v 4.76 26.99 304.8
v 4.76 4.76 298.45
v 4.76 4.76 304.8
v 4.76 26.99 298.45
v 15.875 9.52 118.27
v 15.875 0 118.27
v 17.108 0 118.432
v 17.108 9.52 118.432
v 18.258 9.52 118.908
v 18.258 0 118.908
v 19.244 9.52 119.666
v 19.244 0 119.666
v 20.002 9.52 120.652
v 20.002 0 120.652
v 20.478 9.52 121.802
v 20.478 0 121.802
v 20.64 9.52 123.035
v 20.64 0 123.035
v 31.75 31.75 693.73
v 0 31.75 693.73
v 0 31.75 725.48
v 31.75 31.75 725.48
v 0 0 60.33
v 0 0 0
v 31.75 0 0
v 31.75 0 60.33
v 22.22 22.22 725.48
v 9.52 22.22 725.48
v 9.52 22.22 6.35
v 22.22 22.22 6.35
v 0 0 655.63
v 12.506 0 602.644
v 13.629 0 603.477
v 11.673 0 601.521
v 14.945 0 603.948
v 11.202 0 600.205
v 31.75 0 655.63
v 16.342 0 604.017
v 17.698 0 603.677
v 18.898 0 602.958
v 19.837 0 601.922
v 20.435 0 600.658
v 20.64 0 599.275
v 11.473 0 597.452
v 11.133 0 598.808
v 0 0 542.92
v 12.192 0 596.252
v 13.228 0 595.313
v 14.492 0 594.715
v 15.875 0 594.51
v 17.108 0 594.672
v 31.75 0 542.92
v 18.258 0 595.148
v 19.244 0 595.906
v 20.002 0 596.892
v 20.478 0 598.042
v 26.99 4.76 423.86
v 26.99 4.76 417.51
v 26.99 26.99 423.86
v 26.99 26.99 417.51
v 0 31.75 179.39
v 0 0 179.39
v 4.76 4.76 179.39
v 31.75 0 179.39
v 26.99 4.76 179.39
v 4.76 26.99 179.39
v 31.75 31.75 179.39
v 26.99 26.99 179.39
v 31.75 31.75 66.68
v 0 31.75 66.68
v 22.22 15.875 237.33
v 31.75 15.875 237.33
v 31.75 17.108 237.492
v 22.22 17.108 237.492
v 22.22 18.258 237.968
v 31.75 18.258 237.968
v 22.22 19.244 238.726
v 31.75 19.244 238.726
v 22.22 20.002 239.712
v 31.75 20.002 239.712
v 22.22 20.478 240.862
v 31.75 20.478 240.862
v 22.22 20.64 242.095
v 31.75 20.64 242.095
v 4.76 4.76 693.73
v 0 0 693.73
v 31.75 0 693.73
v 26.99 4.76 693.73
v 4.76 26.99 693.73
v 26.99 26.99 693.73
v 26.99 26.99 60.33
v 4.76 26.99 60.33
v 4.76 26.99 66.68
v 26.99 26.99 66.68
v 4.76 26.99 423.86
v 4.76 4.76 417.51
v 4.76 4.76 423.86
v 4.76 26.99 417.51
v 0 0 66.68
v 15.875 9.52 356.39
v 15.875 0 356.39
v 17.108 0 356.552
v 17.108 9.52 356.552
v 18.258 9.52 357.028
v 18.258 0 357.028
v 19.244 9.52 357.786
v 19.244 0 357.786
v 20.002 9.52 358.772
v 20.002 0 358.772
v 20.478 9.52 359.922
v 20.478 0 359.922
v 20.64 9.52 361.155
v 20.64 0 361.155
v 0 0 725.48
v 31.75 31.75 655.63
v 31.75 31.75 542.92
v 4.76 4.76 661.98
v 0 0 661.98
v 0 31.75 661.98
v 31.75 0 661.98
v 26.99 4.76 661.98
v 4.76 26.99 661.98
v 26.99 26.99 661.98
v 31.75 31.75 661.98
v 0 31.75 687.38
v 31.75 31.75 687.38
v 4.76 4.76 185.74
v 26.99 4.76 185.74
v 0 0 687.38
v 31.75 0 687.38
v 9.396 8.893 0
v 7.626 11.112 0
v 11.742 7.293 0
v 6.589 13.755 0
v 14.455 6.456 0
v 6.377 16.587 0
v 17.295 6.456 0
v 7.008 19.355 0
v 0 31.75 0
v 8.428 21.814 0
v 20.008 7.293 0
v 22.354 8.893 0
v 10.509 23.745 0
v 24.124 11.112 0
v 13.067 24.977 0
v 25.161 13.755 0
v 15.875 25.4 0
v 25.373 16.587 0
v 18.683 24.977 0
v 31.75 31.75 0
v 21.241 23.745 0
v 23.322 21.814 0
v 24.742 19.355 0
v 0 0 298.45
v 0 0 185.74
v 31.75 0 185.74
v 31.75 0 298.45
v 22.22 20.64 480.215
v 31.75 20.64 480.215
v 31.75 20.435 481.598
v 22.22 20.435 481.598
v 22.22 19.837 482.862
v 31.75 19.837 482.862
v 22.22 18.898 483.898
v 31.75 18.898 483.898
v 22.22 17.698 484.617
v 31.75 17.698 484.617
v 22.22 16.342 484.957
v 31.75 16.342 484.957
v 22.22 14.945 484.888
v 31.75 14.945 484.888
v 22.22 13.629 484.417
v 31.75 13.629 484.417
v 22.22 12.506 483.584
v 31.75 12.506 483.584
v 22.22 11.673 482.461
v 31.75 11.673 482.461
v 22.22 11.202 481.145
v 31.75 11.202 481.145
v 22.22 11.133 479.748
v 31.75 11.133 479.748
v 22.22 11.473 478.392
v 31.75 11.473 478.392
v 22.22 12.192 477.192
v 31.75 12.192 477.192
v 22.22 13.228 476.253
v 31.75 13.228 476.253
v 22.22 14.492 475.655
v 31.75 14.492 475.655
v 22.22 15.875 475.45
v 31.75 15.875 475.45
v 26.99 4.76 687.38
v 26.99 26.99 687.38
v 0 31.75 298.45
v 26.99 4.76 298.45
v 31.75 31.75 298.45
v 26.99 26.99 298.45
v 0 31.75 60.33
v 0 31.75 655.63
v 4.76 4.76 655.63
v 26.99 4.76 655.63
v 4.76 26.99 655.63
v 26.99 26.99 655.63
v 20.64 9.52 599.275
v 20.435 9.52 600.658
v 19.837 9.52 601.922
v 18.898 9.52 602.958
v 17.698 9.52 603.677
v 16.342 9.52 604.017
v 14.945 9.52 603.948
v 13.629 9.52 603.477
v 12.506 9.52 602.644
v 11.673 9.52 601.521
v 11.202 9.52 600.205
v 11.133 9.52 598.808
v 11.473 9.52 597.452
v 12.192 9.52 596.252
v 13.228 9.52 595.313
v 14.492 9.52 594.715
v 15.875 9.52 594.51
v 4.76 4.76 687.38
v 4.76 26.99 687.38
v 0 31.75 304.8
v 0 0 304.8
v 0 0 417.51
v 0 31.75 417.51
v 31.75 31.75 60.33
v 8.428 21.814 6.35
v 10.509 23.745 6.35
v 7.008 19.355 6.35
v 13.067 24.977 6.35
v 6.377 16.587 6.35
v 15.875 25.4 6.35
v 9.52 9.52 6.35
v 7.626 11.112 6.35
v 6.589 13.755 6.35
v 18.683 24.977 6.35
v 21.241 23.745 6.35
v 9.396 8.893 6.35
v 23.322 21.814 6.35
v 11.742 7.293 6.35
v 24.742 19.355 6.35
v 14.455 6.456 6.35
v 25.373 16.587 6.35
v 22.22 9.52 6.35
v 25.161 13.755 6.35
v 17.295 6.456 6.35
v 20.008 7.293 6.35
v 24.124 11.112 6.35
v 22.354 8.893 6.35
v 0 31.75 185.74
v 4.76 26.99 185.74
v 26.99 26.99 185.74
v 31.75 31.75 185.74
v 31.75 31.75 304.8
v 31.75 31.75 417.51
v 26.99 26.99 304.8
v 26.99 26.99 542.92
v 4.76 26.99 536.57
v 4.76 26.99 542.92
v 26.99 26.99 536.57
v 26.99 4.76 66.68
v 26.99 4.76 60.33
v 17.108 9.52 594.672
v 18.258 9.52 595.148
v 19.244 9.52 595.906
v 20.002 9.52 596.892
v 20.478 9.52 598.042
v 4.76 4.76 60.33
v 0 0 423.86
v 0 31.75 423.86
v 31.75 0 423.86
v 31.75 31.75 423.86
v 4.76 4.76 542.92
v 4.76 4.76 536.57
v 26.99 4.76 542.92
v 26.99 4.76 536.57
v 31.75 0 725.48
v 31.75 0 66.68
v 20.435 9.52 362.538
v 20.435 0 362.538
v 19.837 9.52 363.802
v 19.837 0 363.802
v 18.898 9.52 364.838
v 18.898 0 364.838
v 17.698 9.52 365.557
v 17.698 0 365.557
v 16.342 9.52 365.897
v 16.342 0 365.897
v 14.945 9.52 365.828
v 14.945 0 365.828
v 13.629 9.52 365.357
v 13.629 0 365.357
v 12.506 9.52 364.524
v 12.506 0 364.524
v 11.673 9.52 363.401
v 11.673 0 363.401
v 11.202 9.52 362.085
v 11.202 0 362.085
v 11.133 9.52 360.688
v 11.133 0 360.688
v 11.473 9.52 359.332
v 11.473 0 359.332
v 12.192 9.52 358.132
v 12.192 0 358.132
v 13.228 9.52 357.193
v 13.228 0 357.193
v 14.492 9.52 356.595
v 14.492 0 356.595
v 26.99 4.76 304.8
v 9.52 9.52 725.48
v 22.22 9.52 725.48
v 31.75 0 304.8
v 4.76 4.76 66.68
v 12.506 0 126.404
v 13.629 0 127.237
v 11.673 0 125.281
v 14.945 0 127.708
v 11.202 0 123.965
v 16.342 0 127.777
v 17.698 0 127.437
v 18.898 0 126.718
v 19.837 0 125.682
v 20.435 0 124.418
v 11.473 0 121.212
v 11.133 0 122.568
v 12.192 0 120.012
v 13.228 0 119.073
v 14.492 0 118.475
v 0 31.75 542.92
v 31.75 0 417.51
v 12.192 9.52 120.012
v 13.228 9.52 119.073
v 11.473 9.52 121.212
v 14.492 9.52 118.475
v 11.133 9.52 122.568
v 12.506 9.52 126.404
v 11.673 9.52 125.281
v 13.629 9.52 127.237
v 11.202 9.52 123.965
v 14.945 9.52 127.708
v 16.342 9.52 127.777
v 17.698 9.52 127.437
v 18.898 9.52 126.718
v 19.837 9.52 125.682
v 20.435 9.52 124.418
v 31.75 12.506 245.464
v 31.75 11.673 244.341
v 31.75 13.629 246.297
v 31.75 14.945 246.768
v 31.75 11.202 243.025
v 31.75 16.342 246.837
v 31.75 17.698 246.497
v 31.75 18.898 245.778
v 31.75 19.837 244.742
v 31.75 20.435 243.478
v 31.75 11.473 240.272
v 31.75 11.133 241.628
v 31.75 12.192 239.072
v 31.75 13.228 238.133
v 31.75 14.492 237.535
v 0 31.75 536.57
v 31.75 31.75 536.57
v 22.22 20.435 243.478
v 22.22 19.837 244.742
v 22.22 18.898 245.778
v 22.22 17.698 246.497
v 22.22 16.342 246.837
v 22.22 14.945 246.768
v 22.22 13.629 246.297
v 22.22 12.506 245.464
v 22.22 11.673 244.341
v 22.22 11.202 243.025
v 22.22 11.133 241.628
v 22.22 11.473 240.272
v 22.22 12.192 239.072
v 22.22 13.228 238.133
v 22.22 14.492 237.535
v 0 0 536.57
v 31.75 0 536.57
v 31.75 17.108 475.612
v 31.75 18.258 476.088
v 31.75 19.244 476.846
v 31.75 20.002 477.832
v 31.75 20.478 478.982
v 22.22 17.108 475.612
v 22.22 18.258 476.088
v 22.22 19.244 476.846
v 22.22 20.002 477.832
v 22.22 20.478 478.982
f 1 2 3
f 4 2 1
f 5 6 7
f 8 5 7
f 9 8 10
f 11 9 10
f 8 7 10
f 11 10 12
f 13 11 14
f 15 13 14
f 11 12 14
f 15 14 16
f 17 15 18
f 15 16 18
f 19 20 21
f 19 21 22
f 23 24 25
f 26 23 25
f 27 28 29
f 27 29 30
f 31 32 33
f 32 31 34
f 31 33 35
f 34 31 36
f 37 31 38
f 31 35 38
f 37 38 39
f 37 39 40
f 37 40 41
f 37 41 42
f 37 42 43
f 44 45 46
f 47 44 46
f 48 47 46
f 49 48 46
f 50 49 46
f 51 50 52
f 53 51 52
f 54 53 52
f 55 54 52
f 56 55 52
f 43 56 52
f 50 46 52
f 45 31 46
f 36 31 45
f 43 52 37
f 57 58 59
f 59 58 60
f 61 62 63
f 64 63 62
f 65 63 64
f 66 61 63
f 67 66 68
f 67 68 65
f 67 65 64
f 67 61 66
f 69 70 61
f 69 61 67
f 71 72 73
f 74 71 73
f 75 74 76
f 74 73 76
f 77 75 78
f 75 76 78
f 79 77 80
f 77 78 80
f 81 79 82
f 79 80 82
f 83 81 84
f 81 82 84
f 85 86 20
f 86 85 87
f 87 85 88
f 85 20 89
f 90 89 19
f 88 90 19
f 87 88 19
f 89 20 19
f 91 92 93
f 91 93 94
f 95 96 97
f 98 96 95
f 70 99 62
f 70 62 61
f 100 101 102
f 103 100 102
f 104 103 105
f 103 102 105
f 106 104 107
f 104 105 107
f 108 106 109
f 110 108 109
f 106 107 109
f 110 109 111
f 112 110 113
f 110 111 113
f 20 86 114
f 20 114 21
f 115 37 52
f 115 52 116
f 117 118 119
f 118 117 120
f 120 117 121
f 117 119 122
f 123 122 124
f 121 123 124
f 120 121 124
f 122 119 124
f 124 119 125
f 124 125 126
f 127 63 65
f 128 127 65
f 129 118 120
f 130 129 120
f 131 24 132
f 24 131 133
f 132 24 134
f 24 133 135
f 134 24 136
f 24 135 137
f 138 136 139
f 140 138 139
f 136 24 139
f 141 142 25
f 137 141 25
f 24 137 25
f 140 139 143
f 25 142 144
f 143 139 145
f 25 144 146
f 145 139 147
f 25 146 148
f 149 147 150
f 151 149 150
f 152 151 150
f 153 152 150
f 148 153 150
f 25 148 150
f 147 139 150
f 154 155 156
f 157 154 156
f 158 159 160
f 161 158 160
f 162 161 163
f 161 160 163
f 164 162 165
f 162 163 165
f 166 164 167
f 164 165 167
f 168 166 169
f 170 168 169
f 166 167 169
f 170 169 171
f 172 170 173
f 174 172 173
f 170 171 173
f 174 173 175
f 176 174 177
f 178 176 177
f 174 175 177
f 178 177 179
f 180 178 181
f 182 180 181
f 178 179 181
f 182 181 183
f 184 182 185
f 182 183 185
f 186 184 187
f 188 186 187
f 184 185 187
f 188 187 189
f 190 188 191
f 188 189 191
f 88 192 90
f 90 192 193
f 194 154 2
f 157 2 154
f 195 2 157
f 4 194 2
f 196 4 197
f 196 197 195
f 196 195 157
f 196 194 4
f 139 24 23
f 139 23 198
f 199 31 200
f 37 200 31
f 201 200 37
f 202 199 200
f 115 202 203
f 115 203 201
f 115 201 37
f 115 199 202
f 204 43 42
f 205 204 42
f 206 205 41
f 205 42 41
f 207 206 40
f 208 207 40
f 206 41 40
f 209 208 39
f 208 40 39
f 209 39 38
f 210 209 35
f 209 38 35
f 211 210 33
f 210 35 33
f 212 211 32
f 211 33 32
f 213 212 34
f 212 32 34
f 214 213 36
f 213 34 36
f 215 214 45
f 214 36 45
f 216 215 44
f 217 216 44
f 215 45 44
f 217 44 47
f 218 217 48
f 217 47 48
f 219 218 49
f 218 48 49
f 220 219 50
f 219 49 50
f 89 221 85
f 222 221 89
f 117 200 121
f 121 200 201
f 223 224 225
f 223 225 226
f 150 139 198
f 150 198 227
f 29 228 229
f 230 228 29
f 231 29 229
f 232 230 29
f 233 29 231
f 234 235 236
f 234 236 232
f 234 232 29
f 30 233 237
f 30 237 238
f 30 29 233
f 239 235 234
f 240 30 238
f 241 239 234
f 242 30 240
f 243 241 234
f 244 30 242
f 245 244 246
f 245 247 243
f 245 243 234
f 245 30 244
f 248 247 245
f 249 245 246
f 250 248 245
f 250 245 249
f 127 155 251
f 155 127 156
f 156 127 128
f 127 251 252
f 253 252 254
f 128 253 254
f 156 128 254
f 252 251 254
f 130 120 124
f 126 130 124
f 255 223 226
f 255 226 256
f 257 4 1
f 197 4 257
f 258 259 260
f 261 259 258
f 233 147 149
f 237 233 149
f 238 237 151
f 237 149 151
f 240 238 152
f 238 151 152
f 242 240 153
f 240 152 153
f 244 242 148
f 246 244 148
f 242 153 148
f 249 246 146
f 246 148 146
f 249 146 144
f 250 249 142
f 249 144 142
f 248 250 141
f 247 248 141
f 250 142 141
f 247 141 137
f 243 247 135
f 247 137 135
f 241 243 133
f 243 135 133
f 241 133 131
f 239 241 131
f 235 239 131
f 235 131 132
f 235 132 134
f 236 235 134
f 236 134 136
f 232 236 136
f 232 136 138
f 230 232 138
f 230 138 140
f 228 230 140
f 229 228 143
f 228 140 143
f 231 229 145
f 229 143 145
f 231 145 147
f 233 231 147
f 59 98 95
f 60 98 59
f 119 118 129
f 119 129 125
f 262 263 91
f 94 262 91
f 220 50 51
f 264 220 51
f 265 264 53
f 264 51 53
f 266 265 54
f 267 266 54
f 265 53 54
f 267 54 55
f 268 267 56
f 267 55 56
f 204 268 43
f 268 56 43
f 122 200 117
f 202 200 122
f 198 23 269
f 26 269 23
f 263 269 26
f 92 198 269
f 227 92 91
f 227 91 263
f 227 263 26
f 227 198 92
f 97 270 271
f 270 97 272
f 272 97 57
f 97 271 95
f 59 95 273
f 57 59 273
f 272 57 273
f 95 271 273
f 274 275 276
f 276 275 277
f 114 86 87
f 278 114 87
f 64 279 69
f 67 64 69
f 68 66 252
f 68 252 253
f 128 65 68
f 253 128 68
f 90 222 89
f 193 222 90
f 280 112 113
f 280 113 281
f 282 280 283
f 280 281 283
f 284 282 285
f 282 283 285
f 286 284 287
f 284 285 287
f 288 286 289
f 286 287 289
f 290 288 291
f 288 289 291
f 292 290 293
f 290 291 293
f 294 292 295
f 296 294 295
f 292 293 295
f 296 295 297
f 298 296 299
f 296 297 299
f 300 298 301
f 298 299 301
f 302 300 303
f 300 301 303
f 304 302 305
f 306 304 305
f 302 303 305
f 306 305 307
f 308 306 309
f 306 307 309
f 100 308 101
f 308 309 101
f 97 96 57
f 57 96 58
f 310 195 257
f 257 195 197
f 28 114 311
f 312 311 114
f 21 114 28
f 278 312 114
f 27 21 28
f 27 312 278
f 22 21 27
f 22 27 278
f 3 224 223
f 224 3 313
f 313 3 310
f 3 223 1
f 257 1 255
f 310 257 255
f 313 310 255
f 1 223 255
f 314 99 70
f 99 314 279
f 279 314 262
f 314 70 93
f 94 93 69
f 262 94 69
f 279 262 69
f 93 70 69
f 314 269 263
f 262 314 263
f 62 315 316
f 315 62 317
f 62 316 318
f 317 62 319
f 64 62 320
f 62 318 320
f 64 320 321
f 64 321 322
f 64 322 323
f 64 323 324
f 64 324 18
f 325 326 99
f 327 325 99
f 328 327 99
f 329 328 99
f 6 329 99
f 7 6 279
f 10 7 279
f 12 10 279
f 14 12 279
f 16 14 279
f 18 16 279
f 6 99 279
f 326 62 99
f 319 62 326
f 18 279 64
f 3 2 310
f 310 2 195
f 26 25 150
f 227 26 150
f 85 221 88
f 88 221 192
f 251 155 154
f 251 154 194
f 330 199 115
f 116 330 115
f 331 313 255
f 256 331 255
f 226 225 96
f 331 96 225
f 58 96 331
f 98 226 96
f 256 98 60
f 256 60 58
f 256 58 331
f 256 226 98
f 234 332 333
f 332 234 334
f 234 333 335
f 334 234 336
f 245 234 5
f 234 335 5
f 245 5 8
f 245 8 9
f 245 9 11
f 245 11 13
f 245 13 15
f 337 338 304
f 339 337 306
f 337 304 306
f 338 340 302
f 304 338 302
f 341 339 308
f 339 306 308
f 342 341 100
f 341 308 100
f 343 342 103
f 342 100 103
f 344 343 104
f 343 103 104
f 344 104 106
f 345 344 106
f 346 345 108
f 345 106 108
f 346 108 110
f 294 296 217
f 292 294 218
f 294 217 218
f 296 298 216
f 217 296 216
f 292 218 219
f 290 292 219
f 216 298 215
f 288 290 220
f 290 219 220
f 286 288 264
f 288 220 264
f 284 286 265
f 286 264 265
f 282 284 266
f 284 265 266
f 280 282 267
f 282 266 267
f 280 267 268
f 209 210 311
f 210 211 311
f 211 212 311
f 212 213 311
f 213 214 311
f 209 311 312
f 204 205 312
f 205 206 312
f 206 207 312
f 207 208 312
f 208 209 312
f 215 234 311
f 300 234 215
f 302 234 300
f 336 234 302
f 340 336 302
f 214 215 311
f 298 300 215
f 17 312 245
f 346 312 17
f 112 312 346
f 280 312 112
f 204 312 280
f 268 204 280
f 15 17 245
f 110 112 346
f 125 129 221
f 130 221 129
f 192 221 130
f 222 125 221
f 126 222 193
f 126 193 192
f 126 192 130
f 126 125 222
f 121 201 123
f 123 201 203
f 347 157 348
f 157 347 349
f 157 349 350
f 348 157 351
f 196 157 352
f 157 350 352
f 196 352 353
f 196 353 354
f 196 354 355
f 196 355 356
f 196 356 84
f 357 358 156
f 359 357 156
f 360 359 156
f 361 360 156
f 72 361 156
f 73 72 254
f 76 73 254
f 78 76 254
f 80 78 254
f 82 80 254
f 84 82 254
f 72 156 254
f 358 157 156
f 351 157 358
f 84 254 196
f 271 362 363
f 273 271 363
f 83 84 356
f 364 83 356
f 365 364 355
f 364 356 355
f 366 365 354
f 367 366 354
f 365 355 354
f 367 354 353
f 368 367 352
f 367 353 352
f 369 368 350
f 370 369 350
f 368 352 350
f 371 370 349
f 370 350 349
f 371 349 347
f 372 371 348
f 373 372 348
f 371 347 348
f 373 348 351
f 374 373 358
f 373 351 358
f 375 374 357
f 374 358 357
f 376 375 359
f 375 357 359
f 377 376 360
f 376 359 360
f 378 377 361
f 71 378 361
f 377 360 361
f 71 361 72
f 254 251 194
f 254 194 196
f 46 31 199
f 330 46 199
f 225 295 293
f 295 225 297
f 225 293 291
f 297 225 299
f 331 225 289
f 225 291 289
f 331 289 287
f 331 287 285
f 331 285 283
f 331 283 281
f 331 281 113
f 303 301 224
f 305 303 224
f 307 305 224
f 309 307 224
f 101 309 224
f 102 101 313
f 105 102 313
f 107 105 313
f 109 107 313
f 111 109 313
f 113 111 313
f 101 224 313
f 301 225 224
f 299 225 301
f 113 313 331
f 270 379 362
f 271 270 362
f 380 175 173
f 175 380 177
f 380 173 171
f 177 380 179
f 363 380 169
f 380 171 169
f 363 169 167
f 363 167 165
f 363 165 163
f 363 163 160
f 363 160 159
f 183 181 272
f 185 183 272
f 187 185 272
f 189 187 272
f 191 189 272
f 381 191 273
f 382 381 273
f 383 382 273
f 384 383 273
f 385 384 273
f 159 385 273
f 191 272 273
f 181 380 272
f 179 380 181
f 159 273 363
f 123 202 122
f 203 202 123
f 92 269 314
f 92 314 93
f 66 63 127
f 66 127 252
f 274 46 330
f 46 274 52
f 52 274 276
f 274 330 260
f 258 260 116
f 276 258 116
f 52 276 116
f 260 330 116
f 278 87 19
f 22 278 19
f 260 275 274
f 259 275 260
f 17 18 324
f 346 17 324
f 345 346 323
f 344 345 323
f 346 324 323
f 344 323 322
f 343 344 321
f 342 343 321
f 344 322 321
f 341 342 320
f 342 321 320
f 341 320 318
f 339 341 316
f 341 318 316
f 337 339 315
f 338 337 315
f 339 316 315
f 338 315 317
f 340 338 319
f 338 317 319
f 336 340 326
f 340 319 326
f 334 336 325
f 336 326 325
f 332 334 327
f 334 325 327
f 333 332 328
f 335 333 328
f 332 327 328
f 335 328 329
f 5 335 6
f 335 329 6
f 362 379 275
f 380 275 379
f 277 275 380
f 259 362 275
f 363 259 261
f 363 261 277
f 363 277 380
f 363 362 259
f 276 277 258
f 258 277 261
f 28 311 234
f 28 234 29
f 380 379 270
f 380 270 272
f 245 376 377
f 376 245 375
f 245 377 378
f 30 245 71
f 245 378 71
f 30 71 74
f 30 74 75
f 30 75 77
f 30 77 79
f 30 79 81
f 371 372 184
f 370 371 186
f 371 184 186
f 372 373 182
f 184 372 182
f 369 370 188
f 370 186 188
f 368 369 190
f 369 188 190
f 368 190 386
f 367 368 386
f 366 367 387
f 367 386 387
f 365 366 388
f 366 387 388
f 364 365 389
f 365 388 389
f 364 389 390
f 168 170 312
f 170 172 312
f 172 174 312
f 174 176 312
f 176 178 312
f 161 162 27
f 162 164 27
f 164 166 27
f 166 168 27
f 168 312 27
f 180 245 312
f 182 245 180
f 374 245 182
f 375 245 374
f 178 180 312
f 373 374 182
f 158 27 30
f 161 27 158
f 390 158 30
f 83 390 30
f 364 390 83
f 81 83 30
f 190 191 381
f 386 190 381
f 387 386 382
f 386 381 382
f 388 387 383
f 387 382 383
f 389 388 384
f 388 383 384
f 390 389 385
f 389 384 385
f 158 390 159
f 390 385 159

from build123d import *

# Parameters (mm, degrees)
F0_W      = 31.75
F0_H      = 31.75
F1_DEPTH  = 60.33
F2_W      = 22.23
F2_H      = 22.23
F3_DEPTH  = 6.35
F4_W      = 31.75
F4_H      = 31.75
F5_DEPTH  = 112.71
F6_W      = 22.23
F6_H      = 22.23
F7_DEPTH  = 6.35
F8_W      = 31.75
F8_H      = 31.75
F8_W_2    = 22.23
F8_H_2    = 22.23
F9_DEPTH  = 112.71
F10_W     = 22.23
F10_H     = 22.23
F11_DEPTH = 6.35
F12_W     = 31.75
F12_H     = 31.75
F12_W_2   = 22.23
F12_H_2   = 22.23
F13_DEPTH = 112.71
F14_W     = 22.23
F14_H     = 22.23
F15_DEPTH = 6.35
F16_W     = 31.75
F16_H     = 31.75
F17_DEPTH = 112.71
F18_W     = 22.23
F18_H     = 22.23
F19_DEPTH = 6.35
F20_W     = 31.75
F20_H     = 31.75
F20_W_2   = 22.23
F20_H_2   = 22.23
F21_DEPTH = 112.71
F22_W     = 22.23
F22_H     = 22.23
F23_DEPTH = 6.35
F24_W     = 31.75
F24_H     = 31.75
F24_W_2   = 22.23
F24_H_2   = 22.23
F25_DEPTH = 25.4
F26_W     = 22.23
F26_H     = 22.23
F27_DEPTH = 6.35
F28_W     = 31.75
F28_H     = 31.75
F28_W_2   = 22.23
F28_H_2   = 22.23
F29_DEPTH = 31.75
F32_DEPTH = 12.7
F34_DEPTH = 12.7
F36_DEPTH = 12.7
F38_DEPTH = 12.7
F40_DEPTH = 12.7
F41_W     = 12.7
F41_H     = 12.7
F42_DEPTH = 736.6
F43_DEPTH = 6.35


with BuildPart() as f1:
    # F0 (on Top) → F1 (new body)
    with BuildSketch(Plane.XY):
        with Locations((15.875, 15.875)):
            Rectangle(F0_W, F0_H)
    extrude(amount=F1_DEPTH)

    # F2 (on face) → F3 (join)
    with BuildSketch(Plane.XY.offset(60.33)):
        with Locations((15.875, 15.875)):
            Rectangle(F2_W, F2_H)
    extrude(amount=F3_DEPTH)

    # F4 (on face) → F5 (join)
    with BuildSketch(Plane.XY.offset(66.68)):
        with Locations((15.875, 15.875)):
            Rectangle(F4_W, F4_H)
    extrude(amount=F5_DEPTH)

    # F6 (on face) → F7 (join)
    with BuildSketch(Plane.XY.offset(179.39)):
        with Locations((15.875, 15.875)):
            Rectangle(F6_W, F6_H)
    extrude(amount=F7_DEPTH)

    # F8 (on face) → F9 (join)
    with BuildSketch(Plane.XY.offset(185.74)):
        with Locations((15.875, 15.875)):
            Rectangle(F8_W, F8_H)
        with Locations((15.875, 15.875)):
            Rectangle(F8_W_2, F8_H_2, mode=Mode.SUBTRACT)
        with Locations((15.875, 15.875)):
            Rectangle(F8_W_2, F8_H_2)
    extrude(amount=F9_DEPTH)

    # F10 (on face) → F11 (join)
    with BuildSketch(Plane.XY.offset(298.45)):
        with Locations((15.875, 15.875)):
            Rectangle(F10_W, F10_H)
    extrude(amount=F11_DEPTH)

    # F12 (on face) → F13 (join)
    with BuildSketch(Plane.XY.offset(304.8)):
        with Locations((15.875, 15.875)):
            Rectangle(F12_W, F12_H)
        with Locations((15.875, 15.875)):
            Rectangle(F12_W_2, F12_H_2, mode=Mode.SUBTRACT)
        with Locations((15.875, 15.875)):
            Rectangle(F12_W_2, F12_H_2)
    extrude(amount=F13_DEPTH)

    # F14 (on face) → F15 (join)
    with BuildSketch(Plane.XY.offset(417.51)):
        with Locations((15.875, 15.875)):
            Rectangle(F14_W, F14_H)
    extrude(amount=F15_DEPTH)

    # F16 (on face) → F17 (join)
    with BuildSketch(Plane.XY.offset(423.86)):
        with Locations((15.875, 15.875)):
            Rectangle(F16_W, F16_H)
    extrude(amount=F17_DEPTH)

    # F18 (on face) → F19 (join)
    with BuildSketch(Plane.XY.offset(536.57)):
        with Locations((15.875, 15.875)):
            Rectangle(F18_W, F18_H)
    extrude(amount=F19_DEPTH)

    # F20 (on face) → F21 (join)
    with BuildSketch(Plane.XY.offset(542.92)):
        with Locations((15.875, 15.875)):
            Rectangle(F20_W, F20_H)
        with Locations((15.875, 15.875)):
            Rectangle(F20_W_2, F20_H_2, mode=Mode.SUBTRACT)
        with Locations((15.875, 15.875)):
            Rectangle(F20_W_2, F20_H_2)
    extrude(amount=F21_DEPTH)

    # F22 (on face) → F23 (join)
    with BuildSketch(Plane.XY.offset(655.63)):
        with Locations((15.875, 15.875)):
            Rectangle(F22_W, F22_H)
    extrude(amount=F23_DEPTH)

    # F24 (on face) → F25 (join)
    with BuildSketch(Plane.XY.offset(661.98)):
        with Locations((15.875, 15.875)):
            Rectangle(F24_W, F24_H)
        with Locations((15.875, 15.875)):
            Rectangle(F24_W_2, F24_H_2, mode=Mode.SUBTRACT)
        with Locations((15.875, 15.875)):
            Rectangle(F24_W_2, F24_H_2)
    extrude(amount=F25_DEPTH)

    # F26 (on face) → F27 (join)
    with BuildSketch(Plane.XY.offset(687.38)):
        with Locations((15.875, 15.875)):
            Rectangle(F26_W, F26_H)
    extrude(amount=F27_DEPTH)

    # F28 (on face) → F29 (join)
    with BuildSketch(Plane.XY.offset(693.73)):
        with Locations((15.875, 15.875)):
            Rectangle(F28_W, F28_H)
        with Locations((15.875, 15.875)):
            Rectangle(F28_W_2, F28_H_2, mode=Mode.SUBTRACT)
        with Locations((15.875, 15.875)):
            Rectangle(F28_W_2, F28_H_2)
    extrude(amount=F29_DEPTH)

    # F31 (on face) → F32 (cut)
    with BuildSketch(Plane.XZ):
        with BuildLine():
            Line((15.875, 123.035), (20.64, 123.035))
            ThreePointArc((20.64, 123.035), (12.5056361876, 126.4043638124), (15.875, 118.27))
            Line((15.875, 118.27), (15.875, 123.035))
        make_face()
        with BuildLine():
            ThreePointArc((15.875, 118.27), (19.2443638124, 119.6656361876), (20.64, 123.035))
            Line((20.64, 123.035), (15.875, 123.035))
            Line((15.875, 123.035), (15.875, 118.27))
        make_face()
    extrude(amount=-F32_DEPTH, mode=Mode.SUBTRACT)

    # F33 (on face) → F34 (cut)
    with BuildSketch(Plane.YZ.offset(31.75)):
        with BuildLine():
            Line((15.875, 242.095), (20.64, 242.095))
            ThreePointArc((20.64, 242.095), (12.5056361876, 245.4643638124), (15.875, 237.33))
            Line((15.875, 237.33), (15.875, 242.095))
        make_face()
        with BuildLine():
            ThreePointArc((15.875, 237.33), (19.2443638124, 238.7256361876), (20.64, 242.095))
            Line((20.64, 242.095), (15.875, 242.095))
            Line((15.875, 242.095), (15.875, 237.33))
        make_face()
    extrude(amount=-F34_DEPTH, mode=Mode.SUBTRACT)

    # F35 (on face) → F36 (cut)
    with BuildSketch(Plane.XZ):
        with BuildLine():
            Line((15.875, 361.155), (20.64, 361.155))
            ThreePointArc((20.64, 361.155), (12.5056361876, 364.5243638124), (15.875, 356.39))
            Line((15.875, 356.39), (15.875, 361.155))
        make_face()
        with BuildLine():
            ThreePointArc((15.875, 356.39), (19.2443638124, 357.7856361876), (20.64, 361.155))
            Line((20.64, 361.155), (15.875, 361.155))
            Line((15.875, 361.155), (15.875, 356.39))
        make_face()
    extrude(amount=-F36_DEPTH, mode=Mode.SUBTRACT)

    # F37 (on face) → F38 (cut)
    with BuildSketch(Plane.YZ.offset(31.75)):
        with BuildLine():
            Line((15.875, 480.215), (20.64, 480.215))
            ThreePointArc((20.64, 480.215), (12.5056361876, 483.5843638124), (15.875, 475.45))
            Line((15.875, 475.45), (15.875, 480.215))
        make_face()
        with BuildLine():
            ThreePointArc((15.875, 475.45), (19.2443638124, 476.8456361876), (20.64, 480.215))
            Line((20.64, 480.215), (15.875, 480.215))
            Line((15.875, 480.215), (15.875, 475.45))
        make_face()
    extrude(amount=-F38_DEPTH, mode=Mode.SUBTRACT)

    # F39 (on face) → F40 (cut)
    with BuildSketch(Plane.XZ):
        with BuildLine():
            Line((15.875, 599.275), (20.64, 599.275))
            ThreePointArc((20.64, 599.275), (12.5056361876, 602.6443638124), (15.875, 594.51))
            Line((15.875, 594.51), (15.875, 599.275))
        make_face()
        with BuildLine():
            ThreePointArc((15.875, 594.51), (19.2443638124, 595.9056361876), (20.64, 599.275))
            Line((20.64, 599.275), (15.875, 599.275))
            Line((15.875, 599.275), (15.875, 594.51))
        make_face()
    extrude(amount=-F40_DEPTH, mode=Mode.SUBTRACT)

    # F41 (on face) → F42 (cut)
    with BuildSketch(Plane.XY.offset(725.48)):
        with Locations((15.87, 15.87)):
            Rectangle(F41_W, F41_H)
    extrude(amount=-F42_DEPTH, mode=Mode.SUBTRACT)

    # F30 (on face) → F43 (cut)
    with BuildSketch(Plane(origin=(0, 0, 0), x_dir=(1, 0, 0), z_dir=(0, 0, -1))):
        with BuildLine():
            ThreePointArc((6.35, -15.875), (9.1398079092, -22.6101920908), (15.875, -25.4))
            Line((15.875, -25.4), (15.875, -15.875))
            Line((15.875, -15.875), (6.35, -15.875))
        make_face()
        with BuildLine():
            Line((15.875, -15.875), (15.875, -25.4))
            ThreePointArc((15.875, -25.4), (22.6101920908, -22.6101920908), (25.4, -15.875))
            ThreePointArc((25.4, -15.875), (15.875, -6.35), (6.35, -15.875))
            Line((6.35, -15.875), (15.875, -15.875))
        make_face()
    extrude(amount=-F43_DEPTH, mode=Mode.SUBTRACT)


solid = f1.part
